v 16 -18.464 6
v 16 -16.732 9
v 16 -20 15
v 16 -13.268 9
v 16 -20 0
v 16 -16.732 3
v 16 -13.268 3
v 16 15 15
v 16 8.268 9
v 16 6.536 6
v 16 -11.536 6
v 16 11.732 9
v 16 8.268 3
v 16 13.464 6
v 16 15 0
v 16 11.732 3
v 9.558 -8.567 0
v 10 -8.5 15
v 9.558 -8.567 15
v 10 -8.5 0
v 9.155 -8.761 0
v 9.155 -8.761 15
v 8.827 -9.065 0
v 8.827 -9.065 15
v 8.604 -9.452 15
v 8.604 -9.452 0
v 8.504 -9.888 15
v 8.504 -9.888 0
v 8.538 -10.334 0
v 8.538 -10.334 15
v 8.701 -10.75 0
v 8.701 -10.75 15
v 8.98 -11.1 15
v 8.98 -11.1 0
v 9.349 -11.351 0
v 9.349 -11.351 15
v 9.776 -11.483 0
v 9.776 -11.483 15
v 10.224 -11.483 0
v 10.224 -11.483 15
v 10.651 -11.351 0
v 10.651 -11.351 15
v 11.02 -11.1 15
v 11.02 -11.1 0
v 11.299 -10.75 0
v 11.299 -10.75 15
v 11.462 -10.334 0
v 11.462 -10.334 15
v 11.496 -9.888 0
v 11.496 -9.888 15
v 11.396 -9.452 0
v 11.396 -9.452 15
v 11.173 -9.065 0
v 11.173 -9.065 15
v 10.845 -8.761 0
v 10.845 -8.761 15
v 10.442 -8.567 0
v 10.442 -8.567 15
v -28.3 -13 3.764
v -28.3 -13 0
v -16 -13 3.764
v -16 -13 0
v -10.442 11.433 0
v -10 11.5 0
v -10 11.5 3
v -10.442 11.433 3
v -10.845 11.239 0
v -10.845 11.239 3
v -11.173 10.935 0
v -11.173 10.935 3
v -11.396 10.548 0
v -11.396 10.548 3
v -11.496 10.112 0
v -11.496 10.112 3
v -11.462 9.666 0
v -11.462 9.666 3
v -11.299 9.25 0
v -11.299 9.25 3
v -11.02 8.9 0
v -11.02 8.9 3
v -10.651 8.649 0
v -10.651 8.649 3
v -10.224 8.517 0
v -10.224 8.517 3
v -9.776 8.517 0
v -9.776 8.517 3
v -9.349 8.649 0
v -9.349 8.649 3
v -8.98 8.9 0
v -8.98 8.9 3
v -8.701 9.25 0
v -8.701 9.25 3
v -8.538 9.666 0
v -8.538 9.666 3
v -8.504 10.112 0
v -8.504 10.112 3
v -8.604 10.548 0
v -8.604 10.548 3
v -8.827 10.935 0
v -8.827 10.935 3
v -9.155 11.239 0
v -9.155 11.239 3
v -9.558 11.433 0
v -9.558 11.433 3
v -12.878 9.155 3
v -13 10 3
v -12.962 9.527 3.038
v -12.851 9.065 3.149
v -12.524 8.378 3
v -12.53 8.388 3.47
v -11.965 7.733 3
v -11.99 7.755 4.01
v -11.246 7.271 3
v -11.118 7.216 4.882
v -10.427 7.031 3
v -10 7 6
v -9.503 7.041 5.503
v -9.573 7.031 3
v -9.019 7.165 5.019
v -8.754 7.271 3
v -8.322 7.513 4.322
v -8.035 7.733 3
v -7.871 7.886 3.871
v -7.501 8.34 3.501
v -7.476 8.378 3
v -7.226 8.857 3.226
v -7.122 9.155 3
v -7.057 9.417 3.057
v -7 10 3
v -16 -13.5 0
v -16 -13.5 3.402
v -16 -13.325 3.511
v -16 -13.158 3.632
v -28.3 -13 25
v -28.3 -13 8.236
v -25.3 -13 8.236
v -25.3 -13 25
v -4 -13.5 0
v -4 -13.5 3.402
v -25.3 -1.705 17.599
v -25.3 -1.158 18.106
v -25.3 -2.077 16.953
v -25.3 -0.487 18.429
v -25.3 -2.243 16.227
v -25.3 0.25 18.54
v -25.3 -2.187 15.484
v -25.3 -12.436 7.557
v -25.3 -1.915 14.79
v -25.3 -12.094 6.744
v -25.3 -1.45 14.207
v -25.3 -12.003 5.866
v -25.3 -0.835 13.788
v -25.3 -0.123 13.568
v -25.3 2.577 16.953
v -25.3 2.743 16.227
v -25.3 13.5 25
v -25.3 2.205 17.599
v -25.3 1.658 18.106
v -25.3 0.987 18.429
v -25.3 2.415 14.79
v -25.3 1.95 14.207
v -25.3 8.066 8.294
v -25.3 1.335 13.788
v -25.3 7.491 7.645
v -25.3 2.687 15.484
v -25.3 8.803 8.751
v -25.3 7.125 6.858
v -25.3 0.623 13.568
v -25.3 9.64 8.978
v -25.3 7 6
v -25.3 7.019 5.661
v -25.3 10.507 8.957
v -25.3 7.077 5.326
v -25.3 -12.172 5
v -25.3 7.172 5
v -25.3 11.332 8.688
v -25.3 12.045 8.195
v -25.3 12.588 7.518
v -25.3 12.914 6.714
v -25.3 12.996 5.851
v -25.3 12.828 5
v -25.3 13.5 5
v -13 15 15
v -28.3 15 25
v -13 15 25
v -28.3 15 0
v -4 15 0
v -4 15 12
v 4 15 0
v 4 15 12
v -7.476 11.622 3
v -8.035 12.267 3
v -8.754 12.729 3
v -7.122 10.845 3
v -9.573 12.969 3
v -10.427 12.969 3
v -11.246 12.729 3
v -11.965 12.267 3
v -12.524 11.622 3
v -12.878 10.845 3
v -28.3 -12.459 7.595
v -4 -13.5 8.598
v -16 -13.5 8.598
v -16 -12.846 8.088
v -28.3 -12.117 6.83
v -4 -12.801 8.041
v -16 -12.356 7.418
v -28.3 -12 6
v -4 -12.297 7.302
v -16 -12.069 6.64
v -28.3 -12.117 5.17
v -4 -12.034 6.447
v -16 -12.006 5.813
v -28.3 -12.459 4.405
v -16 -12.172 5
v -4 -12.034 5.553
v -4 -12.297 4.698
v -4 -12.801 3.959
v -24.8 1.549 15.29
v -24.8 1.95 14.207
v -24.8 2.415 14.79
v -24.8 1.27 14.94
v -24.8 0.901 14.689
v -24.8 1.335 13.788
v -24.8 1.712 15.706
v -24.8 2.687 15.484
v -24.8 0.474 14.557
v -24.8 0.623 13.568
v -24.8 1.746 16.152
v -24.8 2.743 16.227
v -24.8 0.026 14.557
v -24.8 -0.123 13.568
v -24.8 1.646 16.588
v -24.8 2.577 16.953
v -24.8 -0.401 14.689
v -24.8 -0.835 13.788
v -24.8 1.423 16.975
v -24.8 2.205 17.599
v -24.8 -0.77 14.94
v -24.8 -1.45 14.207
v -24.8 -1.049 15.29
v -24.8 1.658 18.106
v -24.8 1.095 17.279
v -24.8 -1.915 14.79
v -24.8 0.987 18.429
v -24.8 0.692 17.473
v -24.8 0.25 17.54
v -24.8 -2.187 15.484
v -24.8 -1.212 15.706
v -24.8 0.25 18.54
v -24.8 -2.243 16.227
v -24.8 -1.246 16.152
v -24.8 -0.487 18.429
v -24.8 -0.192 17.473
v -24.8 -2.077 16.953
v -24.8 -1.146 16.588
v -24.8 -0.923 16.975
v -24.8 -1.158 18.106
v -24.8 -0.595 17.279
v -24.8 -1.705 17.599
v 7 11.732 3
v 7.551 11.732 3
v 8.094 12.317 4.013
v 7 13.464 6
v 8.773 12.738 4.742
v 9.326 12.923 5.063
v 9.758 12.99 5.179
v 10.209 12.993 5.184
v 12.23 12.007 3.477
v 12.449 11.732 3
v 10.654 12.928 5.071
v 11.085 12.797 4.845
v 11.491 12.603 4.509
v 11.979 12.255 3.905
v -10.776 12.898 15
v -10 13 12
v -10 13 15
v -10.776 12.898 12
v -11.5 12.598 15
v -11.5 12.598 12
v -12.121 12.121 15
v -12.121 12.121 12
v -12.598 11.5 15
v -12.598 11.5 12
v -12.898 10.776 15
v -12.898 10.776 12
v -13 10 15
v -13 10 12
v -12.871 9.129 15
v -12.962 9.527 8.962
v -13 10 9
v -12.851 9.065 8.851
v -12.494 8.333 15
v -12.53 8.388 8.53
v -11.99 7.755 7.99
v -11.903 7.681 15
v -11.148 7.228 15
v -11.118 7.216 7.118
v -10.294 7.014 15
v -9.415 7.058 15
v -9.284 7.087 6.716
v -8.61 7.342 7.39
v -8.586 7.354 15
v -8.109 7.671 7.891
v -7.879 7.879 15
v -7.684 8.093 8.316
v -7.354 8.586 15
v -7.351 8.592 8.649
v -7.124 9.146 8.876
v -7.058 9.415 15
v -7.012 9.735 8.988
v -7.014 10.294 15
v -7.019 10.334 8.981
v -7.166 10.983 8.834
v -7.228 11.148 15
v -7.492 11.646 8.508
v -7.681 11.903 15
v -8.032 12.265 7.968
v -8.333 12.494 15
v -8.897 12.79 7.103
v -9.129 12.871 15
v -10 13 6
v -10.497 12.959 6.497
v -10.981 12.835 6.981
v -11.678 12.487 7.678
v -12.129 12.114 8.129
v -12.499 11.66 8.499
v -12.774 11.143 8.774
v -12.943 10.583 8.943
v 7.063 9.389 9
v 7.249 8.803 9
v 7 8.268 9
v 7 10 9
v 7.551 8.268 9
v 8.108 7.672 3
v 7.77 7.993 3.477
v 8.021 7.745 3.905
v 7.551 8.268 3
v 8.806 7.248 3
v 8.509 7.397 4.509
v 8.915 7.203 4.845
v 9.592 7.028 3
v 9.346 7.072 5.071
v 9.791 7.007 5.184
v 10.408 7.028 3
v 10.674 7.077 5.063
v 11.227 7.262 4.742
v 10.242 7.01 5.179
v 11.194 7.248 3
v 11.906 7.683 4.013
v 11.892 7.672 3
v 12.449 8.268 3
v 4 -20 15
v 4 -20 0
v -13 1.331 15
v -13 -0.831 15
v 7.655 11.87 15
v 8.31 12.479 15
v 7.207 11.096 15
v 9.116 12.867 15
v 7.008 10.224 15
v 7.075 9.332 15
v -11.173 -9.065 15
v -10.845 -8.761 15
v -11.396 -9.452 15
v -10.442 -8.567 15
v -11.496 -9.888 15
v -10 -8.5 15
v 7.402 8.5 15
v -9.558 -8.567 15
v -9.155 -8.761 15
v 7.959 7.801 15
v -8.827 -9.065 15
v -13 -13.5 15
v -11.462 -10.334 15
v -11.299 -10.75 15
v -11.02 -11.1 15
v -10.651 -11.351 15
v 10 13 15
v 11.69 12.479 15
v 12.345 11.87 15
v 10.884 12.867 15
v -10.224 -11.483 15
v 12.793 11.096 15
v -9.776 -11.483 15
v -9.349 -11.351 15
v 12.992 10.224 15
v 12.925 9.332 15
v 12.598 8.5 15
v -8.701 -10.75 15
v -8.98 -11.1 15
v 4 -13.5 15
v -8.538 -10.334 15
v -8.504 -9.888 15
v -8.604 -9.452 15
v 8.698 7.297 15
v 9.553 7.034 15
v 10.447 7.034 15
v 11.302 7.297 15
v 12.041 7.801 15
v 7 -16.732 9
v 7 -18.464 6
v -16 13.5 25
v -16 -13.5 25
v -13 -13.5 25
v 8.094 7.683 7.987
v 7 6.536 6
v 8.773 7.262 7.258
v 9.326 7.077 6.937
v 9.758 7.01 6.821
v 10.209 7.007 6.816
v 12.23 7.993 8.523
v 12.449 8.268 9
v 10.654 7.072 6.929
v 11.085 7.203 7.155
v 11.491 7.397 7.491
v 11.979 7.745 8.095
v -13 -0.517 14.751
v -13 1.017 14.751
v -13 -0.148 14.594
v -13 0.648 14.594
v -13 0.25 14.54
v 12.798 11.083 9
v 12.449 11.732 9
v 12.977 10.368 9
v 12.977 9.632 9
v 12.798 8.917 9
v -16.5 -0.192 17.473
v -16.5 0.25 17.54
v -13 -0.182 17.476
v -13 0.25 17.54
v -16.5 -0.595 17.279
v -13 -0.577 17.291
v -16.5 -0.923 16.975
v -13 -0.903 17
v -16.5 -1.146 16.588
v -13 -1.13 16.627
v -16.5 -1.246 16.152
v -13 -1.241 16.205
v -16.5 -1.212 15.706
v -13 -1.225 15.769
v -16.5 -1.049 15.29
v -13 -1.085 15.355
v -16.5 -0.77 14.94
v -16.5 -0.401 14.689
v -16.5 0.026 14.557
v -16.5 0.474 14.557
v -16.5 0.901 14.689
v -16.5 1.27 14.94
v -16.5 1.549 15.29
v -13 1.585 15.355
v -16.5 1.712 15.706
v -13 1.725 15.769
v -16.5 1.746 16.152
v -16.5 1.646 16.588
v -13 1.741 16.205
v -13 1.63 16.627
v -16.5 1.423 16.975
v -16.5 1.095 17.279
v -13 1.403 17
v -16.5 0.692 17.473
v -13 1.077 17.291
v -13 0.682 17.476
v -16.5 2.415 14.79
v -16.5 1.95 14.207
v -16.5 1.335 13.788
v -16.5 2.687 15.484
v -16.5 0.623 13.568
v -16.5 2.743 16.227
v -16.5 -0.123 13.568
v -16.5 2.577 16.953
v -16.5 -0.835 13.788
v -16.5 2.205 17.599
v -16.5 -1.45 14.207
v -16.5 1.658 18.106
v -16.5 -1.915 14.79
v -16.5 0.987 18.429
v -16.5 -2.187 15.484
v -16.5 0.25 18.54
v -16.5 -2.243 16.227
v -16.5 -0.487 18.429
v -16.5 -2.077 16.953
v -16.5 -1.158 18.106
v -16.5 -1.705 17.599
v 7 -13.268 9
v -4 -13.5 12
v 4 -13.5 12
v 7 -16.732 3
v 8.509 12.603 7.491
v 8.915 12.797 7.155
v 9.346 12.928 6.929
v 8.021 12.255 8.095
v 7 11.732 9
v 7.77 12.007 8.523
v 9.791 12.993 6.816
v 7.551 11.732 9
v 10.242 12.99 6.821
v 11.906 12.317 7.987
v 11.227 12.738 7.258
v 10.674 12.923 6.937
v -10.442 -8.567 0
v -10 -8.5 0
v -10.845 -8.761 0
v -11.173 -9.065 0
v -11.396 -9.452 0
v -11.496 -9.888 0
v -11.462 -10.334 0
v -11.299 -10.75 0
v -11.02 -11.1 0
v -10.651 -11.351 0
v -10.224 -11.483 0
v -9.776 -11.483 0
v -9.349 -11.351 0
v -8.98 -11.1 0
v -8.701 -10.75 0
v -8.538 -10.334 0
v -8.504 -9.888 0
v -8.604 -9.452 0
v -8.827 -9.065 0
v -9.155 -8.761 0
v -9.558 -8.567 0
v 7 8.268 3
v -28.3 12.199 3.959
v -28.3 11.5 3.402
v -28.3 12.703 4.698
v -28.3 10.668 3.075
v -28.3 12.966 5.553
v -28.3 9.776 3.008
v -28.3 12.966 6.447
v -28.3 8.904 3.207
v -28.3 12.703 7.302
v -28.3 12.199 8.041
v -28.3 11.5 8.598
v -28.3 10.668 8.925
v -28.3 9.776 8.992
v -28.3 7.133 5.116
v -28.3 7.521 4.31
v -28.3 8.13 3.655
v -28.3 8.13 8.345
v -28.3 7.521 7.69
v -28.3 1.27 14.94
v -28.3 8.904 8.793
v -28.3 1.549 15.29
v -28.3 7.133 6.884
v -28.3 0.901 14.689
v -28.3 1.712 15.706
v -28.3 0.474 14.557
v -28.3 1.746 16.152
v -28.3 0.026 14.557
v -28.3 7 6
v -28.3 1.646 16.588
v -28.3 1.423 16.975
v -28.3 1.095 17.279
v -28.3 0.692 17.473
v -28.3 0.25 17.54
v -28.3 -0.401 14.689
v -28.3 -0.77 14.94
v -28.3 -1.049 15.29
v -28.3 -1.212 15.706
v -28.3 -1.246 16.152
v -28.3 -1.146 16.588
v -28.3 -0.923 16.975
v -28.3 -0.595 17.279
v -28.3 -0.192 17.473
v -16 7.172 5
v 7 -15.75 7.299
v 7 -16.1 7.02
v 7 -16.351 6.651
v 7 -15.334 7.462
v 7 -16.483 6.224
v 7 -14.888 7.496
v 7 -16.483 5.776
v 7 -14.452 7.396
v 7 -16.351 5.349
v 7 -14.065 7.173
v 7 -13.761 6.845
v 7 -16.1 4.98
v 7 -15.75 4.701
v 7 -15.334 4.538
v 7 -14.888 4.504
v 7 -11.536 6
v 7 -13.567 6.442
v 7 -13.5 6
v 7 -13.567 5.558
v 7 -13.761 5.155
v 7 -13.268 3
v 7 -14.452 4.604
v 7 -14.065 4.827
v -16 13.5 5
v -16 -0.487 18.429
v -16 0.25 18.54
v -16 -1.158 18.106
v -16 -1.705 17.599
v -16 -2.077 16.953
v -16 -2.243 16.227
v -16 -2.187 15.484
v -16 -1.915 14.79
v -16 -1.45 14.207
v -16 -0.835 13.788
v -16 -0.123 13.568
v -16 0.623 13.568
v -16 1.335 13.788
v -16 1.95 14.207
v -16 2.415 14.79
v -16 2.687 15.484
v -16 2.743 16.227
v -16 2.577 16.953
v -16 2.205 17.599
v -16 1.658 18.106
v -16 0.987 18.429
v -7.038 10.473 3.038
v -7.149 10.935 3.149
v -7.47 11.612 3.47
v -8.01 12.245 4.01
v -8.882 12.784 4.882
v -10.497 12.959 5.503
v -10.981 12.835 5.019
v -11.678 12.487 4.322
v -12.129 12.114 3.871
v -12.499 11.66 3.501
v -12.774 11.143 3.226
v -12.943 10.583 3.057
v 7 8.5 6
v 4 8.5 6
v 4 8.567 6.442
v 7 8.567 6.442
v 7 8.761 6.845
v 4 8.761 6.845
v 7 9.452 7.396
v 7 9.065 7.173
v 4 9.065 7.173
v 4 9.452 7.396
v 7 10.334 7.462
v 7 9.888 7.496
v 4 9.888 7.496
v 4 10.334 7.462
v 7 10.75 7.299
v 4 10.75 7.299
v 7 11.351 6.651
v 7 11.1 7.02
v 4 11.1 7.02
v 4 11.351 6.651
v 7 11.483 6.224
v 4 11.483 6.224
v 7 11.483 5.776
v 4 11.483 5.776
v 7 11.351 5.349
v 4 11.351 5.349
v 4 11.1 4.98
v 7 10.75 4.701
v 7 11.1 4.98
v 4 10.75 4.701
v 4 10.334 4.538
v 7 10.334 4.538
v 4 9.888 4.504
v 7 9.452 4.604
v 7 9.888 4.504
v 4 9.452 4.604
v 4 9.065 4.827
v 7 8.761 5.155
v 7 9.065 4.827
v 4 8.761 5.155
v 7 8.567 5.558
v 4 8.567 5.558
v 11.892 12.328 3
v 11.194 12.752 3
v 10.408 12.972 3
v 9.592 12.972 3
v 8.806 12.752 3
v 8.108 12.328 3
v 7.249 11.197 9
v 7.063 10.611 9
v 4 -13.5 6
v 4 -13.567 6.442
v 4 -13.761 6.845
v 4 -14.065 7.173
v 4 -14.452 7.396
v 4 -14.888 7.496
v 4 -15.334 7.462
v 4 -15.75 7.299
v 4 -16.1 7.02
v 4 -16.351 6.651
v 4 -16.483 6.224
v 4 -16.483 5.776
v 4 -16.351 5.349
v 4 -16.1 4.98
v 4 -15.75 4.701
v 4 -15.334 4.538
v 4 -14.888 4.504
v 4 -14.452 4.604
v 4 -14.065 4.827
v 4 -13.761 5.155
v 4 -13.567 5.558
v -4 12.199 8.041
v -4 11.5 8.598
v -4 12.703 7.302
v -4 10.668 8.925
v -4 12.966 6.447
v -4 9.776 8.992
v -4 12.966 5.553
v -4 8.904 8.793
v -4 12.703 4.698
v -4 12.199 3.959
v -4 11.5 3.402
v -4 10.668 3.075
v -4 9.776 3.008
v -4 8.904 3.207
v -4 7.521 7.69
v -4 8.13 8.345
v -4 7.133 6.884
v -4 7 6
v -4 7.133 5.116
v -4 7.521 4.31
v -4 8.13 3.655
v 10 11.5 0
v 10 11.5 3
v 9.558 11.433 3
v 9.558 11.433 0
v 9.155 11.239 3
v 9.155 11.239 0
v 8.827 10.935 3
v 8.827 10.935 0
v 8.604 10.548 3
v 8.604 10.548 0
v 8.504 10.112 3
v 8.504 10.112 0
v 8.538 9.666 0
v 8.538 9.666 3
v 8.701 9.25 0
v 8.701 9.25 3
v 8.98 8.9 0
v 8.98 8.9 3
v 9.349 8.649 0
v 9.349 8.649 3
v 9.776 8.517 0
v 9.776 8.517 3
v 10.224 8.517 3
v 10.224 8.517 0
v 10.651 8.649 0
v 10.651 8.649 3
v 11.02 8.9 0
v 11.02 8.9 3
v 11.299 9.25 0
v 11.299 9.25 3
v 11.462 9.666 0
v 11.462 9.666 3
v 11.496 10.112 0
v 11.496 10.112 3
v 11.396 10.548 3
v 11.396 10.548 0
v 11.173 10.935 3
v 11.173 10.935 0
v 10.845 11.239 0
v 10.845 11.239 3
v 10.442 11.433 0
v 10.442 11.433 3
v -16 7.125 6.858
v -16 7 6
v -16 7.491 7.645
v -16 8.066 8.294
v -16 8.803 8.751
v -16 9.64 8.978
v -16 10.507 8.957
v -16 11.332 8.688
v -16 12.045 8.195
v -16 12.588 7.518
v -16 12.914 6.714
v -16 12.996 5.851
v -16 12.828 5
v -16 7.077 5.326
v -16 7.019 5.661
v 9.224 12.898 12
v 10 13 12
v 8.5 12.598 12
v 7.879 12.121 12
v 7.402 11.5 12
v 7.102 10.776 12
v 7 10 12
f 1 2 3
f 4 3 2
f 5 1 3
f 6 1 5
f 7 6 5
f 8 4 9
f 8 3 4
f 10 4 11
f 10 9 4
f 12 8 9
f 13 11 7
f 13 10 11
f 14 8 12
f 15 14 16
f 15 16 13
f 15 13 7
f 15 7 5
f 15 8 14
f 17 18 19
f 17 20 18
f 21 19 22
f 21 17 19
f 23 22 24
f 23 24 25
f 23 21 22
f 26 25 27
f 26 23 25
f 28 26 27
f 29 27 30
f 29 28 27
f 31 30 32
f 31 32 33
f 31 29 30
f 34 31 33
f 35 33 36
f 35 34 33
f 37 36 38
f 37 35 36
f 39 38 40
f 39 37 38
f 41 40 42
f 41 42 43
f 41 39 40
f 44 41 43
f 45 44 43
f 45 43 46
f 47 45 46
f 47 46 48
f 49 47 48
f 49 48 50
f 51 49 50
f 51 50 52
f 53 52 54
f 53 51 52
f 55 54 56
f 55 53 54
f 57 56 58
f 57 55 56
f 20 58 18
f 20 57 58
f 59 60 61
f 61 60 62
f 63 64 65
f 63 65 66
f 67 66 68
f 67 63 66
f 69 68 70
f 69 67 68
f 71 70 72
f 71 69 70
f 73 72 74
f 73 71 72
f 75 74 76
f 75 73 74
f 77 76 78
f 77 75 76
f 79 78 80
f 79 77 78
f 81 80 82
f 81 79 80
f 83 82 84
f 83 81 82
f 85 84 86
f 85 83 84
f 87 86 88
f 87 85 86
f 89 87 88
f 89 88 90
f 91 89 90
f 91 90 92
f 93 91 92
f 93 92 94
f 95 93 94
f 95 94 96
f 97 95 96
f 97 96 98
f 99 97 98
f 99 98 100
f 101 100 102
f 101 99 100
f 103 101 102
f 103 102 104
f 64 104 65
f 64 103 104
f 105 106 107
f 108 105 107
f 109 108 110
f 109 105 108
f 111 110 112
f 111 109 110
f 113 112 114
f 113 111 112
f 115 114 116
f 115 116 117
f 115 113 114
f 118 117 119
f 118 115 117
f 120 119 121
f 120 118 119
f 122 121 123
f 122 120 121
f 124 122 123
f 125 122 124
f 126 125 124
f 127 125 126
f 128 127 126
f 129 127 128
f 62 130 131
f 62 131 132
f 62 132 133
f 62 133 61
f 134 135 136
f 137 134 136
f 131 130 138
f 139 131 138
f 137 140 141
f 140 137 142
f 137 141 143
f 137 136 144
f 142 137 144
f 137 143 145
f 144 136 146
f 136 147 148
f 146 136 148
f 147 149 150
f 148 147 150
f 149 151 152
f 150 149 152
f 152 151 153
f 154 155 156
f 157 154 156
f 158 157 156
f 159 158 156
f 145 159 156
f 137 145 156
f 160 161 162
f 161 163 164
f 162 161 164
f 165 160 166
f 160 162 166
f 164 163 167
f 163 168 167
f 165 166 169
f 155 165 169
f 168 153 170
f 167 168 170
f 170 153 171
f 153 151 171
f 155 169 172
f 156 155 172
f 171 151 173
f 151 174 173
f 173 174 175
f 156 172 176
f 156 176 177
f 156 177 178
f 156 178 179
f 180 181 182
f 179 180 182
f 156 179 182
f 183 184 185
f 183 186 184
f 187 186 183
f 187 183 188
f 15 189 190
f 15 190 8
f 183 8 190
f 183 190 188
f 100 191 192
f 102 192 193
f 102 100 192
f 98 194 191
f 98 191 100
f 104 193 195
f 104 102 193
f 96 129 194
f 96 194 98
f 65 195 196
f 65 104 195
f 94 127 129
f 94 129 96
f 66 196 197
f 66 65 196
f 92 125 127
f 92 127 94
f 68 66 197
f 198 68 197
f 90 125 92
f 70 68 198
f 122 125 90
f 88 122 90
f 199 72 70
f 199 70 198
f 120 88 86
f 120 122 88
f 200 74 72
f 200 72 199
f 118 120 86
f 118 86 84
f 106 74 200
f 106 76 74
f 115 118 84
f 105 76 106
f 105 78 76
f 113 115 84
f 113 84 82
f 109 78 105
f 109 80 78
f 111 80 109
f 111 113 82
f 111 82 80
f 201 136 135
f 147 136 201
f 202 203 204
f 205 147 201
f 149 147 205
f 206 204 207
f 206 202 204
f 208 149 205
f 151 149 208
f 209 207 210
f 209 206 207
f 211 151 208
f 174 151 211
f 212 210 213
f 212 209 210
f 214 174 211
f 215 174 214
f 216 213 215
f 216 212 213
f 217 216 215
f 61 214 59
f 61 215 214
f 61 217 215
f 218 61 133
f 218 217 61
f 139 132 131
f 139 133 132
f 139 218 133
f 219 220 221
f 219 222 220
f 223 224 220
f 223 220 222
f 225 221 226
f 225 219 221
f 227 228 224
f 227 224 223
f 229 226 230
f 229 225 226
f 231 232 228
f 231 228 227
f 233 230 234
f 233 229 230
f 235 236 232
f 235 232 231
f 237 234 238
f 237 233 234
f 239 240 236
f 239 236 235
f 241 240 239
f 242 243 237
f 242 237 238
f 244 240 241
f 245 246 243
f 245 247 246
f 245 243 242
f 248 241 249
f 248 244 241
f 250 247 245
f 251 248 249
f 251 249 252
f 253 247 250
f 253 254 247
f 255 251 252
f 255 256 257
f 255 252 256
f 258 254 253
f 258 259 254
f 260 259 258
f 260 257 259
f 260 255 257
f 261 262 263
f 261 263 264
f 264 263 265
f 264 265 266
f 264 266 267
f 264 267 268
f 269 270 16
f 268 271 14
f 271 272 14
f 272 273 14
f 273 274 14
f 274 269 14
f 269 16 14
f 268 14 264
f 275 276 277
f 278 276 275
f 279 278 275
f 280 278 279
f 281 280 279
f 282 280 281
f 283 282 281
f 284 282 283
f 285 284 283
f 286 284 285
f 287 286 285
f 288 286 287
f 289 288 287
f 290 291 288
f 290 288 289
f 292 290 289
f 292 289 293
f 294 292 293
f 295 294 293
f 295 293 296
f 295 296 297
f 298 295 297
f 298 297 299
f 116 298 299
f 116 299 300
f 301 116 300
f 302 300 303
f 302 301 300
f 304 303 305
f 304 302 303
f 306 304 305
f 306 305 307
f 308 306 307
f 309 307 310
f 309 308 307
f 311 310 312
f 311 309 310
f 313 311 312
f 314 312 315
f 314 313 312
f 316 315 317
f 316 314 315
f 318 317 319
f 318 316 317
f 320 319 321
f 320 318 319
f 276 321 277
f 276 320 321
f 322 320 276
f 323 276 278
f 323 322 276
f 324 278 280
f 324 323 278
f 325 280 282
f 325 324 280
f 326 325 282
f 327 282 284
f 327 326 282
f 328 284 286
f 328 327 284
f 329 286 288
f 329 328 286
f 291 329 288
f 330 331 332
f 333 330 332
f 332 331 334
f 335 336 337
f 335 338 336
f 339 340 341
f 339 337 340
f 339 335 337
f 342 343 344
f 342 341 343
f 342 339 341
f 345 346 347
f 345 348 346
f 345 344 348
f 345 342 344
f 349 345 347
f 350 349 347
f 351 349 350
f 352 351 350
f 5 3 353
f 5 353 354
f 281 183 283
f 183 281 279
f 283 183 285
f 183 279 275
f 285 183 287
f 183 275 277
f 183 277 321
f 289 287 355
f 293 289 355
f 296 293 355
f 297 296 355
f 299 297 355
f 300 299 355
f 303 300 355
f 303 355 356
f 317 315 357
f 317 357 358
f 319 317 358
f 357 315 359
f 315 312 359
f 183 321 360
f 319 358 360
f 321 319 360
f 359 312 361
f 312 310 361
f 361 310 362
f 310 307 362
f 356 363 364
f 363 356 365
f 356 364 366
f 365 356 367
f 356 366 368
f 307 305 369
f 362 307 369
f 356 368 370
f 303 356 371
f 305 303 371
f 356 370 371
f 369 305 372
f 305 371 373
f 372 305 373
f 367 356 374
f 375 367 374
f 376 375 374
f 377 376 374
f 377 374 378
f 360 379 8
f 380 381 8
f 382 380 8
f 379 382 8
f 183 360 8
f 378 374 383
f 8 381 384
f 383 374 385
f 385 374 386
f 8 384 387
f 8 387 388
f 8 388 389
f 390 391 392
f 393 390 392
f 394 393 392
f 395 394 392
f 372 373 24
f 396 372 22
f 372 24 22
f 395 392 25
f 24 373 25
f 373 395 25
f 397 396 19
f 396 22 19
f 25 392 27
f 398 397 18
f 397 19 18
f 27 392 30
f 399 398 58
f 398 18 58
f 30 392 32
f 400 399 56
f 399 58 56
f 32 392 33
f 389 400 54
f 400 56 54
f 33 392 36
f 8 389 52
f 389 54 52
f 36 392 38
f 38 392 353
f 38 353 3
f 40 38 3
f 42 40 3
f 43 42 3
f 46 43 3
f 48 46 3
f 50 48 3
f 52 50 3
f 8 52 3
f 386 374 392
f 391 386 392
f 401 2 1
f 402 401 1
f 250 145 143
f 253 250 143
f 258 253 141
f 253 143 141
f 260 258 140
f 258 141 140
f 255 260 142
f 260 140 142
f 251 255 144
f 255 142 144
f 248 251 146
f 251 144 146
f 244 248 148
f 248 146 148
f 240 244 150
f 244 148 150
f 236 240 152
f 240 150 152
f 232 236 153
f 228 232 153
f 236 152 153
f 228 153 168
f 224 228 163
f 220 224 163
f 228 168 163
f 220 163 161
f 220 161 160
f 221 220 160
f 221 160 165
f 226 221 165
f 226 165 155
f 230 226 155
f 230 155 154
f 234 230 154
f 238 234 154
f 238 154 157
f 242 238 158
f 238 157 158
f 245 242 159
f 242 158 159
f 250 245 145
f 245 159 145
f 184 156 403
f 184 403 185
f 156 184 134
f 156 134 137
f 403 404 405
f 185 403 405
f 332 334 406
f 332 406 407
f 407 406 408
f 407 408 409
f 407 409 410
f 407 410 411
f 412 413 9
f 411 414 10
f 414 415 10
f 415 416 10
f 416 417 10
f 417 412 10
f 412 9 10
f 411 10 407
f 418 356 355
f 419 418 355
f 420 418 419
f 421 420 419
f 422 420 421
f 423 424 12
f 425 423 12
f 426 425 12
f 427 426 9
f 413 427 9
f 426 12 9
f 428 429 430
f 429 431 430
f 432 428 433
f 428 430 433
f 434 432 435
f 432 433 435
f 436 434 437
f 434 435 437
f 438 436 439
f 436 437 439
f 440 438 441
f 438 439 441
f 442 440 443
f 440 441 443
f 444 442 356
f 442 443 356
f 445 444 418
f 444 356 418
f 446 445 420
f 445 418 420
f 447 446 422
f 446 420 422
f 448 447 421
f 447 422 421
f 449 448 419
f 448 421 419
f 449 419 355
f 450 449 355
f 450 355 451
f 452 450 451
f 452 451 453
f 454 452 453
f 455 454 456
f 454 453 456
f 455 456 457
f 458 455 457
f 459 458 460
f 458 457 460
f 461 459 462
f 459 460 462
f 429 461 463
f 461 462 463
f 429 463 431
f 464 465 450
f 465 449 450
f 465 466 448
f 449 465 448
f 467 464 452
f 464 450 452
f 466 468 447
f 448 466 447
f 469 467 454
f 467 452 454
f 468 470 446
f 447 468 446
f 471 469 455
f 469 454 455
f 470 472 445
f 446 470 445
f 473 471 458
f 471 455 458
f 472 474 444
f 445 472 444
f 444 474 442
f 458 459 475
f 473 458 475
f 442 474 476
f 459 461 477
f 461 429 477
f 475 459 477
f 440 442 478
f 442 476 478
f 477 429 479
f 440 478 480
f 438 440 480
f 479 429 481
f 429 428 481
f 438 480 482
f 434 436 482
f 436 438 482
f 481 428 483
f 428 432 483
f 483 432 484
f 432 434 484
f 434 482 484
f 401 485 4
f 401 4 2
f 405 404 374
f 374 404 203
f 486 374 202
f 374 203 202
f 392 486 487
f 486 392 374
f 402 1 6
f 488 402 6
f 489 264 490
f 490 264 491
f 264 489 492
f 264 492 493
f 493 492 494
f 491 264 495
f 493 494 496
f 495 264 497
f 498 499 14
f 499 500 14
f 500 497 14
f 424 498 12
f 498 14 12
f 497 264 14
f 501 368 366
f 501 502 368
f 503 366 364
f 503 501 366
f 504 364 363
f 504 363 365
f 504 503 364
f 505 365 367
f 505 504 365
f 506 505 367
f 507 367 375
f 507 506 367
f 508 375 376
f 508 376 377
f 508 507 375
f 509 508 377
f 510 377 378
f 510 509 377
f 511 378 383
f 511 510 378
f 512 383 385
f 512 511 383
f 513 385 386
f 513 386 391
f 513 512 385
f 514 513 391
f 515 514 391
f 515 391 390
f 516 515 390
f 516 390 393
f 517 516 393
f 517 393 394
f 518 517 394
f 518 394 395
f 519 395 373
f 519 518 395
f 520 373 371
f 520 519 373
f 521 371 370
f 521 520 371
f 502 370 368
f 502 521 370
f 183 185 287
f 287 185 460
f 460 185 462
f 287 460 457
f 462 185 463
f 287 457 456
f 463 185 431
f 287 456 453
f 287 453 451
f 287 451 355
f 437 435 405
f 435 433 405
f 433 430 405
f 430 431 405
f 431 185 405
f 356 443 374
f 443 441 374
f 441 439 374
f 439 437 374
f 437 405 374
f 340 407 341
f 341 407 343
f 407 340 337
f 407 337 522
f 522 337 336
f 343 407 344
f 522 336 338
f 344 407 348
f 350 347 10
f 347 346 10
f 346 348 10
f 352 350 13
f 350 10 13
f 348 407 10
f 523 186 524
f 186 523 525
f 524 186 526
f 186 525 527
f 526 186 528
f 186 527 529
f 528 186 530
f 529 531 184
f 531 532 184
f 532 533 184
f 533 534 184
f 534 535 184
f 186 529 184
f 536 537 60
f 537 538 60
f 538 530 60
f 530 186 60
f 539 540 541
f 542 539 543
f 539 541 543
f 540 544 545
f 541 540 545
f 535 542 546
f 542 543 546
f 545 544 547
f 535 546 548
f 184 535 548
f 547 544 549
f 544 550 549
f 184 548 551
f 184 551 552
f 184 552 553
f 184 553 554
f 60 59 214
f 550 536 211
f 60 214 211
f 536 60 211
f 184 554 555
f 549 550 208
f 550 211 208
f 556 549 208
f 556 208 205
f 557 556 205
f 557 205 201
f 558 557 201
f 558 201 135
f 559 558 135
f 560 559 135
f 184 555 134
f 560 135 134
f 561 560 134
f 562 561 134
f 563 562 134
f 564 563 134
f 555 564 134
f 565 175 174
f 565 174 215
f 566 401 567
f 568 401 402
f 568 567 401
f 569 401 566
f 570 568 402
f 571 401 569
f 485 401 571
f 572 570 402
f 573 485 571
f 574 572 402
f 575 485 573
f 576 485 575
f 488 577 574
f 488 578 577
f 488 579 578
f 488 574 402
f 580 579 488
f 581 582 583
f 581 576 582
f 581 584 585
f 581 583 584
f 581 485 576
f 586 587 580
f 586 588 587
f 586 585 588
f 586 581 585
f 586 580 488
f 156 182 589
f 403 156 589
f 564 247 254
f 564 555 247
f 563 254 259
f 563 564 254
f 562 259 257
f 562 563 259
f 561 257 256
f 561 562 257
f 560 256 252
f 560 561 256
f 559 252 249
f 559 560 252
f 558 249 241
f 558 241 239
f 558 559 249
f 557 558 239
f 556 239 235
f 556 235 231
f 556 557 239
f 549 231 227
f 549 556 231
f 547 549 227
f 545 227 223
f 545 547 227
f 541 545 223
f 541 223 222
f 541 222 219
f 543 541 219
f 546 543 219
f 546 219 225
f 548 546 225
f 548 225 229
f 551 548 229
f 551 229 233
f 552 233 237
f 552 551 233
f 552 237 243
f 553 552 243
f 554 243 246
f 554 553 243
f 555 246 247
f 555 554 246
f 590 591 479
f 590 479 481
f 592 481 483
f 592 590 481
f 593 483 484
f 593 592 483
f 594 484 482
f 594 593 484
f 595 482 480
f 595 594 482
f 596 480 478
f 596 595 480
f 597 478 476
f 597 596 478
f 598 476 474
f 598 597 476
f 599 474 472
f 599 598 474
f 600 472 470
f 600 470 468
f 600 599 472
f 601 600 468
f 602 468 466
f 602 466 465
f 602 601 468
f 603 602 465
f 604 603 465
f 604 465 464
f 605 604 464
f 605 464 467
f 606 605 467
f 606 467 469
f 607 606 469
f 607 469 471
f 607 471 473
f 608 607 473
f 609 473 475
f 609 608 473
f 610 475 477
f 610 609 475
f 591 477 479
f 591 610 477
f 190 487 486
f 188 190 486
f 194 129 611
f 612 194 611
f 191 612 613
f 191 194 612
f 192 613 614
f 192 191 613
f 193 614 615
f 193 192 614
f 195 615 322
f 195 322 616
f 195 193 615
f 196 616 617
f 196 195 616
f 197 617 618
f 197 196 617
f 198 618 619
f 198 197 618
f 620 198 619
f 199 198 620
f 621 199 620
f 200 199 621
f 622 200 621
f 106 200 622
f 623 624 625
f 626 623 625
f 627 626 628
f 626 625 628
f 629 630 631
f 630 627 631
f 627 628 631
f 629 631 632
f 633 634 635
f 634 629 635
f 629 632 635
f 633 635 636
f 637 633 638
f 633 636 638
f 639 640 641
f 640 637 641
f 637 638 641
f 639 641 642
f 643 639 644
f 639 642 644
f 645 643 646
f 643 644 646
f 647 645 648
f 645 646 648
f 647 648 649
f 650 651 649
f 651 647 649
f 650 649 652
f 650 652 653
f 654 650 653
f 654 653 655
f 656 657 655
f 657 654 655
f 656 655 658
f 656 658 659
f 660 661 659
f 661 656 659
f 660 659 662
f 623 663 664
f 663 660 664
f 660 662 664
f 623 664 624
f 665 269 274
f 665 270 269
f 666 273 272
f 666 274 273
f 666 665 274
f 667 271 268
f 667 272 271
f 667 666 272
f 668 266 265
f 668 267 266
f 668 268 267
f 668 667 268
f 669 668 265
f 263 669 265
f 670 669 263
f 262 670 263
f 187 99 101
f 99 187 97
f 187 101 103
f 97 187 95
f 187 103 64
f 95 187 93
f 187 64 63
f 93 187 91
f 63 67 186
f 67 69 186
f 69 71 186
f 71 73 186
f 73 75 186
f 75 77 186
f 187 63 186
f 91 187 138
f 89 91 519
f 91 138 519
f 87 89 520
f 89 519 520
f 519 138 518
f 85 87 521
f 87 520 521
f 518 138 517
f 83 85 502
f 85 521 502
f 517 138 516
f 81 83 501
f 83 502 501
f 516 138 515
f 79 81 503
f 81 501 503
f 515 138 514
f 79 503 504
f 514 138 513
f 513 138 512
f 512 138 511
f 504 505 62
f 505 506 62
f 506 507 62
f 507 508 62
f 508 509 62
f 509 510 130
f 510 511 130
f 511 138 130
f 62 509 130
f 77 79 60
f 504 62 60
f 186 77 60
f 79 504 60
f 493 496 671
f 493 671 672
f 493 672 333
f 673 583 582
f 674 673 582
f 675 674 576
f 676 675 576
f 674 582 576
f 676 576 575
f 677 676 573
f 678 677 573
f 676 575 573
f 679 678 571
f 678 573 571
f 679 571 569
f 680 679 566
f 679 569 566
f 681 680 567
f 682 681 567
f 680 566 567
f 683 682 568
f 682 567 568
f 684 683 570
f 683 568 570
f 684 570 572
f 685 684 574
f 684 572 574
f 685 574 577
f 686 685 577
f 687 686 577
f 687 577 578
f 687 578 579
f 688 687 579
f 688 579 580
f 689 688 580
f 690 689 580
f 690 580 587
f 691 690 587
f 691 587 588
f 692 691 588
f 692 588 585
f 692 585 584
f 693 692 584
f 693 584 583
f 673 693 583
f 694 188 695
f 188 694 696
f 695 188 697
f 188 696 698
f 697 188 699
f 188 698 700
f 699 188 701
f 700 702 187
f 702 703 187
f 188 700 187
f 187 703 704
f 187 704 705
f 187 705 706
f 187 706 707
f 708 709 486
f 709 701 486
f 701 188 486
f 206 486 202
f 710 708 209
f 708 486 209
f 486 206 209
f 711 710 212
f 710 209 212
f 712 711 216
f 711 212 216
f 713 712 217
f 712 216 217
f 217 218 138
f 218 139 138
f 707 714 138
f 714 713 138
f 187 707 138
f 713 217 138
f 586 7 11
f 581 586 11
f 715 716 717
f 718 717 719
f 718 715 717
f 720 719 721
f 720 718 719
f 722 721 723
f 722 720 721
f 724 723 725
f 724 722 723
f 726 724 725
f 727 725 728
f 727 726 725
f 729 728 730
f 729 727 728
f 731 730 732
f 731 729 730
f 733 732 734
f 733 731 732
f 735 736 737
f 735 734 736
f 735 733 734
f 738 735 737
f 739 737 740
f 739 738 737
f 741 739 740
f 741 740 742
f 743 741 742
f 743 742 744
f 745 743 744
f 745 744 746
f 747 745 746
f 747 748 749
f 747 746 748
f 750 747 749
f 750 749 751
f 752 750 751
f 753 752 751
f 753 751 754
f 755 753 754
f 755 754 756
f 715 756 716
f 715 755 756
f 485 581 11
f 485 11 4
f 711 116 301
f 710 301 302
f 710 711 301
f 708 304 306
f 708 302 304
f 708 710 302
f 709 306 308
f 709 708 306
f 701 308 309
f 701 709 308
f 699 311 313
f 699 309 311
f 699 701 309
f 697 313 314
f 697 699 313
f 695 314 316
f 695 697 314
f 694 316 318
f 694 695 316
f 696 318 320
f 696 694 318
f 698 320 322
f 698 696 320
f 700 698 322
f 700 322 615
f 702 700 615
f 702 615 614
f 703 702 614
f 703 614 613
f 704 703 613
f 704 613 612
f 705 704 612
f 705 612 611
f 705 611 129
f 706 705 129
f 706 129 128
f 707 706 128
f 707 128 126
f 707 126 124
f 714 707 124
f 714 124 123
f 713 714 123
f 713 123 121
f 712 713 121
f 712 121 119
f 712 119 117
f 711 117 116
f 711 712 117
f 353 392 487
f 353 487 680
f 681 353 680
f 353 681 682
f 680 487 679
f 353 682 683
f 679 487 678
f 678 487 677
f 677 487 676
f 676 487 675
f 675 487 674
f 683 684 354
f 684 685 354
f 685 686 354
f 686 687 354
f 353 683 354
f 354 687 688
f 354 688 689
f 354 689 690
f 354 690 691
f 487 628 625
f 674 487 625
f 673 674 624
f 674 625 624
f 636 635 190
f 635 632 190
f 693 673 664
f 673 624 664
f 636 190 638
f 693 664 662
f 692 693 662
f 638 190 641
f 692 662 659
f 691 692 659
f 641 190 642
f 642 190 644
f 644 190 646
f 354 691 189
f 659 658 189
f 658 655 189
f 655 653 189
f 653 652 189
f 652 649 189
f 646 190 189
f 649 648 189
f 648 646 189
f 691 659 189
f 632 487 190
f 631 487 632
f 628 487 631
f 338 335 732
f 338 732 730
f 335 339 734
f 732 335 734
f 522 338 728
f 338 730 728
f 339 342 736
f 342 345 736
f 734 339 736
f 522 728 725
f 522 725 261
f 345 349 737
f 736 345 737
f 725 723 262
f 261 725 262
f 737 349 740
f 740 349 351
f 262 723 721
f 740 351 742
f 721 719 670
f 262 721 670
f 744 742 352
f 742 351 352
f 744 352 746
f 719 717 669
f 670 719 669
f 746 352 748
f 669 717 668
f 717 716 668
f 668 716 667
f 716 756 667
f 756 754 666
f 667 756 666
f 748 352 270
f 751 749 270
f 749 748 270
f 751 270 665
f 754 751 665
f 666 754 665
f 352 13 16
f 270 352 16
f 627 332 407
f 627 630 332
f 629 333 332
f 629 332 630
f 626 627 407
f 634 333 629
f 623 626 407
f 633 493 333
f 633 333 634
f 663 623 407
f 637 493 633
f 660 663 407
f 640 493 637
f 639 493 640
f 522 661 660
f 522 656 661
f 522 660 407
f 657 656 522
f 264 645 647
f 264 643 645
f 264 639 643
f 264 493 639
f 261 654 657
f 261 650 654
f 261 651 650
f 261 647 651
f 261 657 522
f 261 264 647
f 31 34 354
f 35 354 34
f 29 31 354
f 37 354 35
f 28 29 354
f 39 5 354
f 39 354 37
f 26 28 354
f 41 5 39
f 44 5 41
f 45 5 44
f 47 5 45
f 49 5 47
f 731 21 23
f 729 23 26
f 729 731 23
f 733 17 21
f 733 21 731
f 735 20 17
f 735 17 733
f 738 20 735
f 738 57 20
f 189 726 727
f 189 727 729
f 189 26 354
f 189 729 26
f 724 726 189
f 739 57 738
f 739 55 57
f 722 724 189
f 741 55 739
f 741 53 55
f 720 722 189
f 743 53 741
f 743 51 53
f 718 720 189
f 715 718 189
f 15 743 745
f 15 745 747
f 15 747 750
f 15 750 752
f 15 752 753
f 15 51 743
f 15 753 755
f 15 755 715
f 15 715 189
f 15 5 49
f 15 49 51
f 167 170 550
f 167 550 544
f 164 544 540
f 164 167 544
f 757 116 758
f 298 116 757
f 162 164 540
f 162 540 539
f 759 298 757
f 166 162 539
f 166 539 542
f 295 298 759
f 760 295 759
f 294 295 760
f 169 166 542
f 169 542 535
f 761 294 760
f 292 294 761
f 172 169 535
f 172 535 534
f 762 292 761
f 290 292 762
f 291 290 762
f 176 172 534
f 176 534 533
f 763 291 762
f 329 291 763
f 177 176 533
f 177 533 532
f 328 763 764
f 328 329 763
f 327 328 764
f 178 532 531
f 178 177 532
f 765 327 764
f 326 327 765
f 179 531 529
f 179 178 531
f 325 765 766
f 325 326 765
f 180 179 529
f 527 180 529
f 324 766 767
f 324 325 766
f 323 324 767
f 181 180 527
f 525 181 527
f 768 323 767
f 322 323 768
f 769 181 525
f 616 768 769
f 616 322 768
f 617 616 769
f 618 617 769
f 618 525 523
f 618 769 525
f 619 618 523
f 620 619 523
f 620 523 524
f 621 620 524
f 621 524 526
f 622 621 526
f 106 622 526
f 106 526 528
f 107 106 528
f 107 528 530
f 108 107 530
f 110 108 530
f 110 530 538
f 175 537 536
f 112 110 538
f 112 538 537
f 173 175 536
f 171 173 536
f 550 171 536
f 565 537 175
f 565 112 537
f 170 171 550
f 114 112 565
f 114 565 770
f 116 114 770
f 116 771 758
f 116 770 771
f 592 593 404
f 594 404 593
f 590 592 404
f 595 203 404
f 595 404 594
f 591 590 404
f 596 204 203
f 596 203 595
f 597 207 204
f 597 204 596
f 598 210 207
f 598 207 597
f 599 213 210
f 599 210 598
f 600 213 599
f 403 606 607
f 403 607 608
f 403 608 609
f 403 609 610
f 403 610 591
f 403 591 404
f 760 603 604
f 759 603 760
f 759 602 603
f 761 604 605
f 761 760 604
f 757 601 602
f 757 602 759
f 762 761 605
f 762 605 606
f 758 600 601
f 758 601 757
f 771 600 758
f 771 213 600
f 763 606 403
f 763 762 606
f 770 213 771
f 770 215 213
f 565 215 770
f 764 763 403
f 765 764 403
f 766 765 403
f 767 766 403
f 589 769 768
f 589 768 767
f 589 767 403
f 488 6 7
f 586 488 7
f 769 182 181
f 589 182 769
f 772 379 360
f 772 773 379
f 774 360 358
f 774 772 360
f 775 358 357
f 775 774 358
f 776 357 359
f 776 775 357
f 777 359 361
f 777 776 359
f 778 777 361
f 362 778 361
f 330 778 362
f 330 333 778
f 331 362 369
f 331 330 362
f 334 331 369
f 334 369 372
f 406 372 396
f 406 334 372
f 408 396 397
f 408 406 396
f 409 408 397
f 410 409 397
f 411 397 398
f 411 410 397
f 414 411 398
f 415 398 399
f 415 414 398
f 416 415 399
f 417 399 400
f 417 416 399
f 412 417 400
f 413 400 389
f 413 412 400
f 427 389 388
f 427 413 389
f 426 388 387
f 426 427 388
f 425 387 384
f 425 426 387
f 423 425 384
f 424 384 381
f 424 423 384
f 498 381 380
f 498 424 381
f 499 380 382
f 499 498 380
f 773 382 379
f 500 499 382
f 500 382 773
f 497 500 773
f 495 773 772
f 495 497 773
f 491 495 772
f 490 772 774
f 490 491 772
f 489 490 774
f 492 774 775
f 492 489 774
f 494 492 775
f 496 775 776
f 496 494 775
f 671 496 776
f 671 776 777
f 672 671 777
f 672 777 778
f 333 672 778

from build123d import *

# Parameters (mm, degrees)
SKETCH1_W           = 12
SKETCH1_H           = 27
SKETCH1_R           = 1.5
SKETCH1_R_2         = 3
BOSS_EXTRUDE1_DEPTH = 12
BOSS_EXTRUDE2_START = 12
SKETCH1_3_W         = 32
SKETCH1_3_H         = 27
SKETCH1_3_R         = 1.5
SKETCH1_3_R_2       = 3
BOSS_EXTRUDE2_DEPTH = 3
SKETCH2_3_R         = 1.5
CUT_EXTRUDE2_DEPTH  = 29.41214529
SKETCH3_W           = 15
SKETCH3_H           = 1.5
SKETCH3_R           = 1.5
BOSS_EXTRUDE3_DEPTH = 12
SKETCH3_4_R         = 1.5
CUT_EXTRUDE3_DEPTH  = 9
SKETCH3_5_R         = 1.5
CUT_EXTRUDE4_DEPTH  = 41.607881008
CUT_EXTRUDE9_START  = 3
SKETCH1_4_R         = 3
SKETCH1_4_R_2       = 1.5
CUT_EXTRUDE9_DEPTH  = 9
SKETCH4_W           = 3
SKETCH4_H           = 26.5
SKETCH4_W_2         = 5
SKETCH4_H_2         = 26
BOSS_EXTRUDE4_DEPTH = 5
SKETCH4_3_W         = 3
SKETCH4_3_H         = 26.5
BOSS_EXTRUDE5_DEPTH = 25
SKETCH5_W           = 3
SKETCH5_H           = 27
BOSS_EXTRUDE6_DEPTH = 10
CUT_EXTRUDE10_REACH = 56.658
SKETCH6_R           = 1.5
SKETCH7_R           = 2.5
SKETCH7_R_2         = 1.5
BOSS_EXTRUDE7_DEPTH = 0.5
BOSS_EXTRUDE8_START = 9.3
SKETCH7_2_R         = 2.5
SKETCH7_2_R_2       = 1.5
BOSS_EXTRUDE8_DEPTH = 0.5
SKETCH2_R           = 3
SKETCH2_R_2         = 1.5
CUT_EXTRUDE1_DEPTH  = 41.193158622
SKETCH8_W           = 9.3
SKETCH8_H           = 20
BOSS_EXTRUDE9_DEPTH = 1.5


with BuildPart() as part:
    # Sketch1 → Boss-Extrude1 (new body)
    with BuildSketch(Plane.XY):
        with Locations((-10, 0)):
            Rectangle(SKETCH1_W, SKETCH1_H)
        with Locations(Location((-10, 10, 0), (0, 0, 90))):
            Circle(SKETCH1_R, mode=Mode.SUBTRACT)
        with Locations(Location((-10, -10, 0), (0, 0, 90))):
            Circle(SKETCH1_R, mode=Mode.SUBTRACT)
        with Locations((10, 0)):
            Rectangle(SKETCH1_W, SKETCH1_H)
        with Locations((10, 10)):
            Circle(SKETCH1_R_2, mode=Mode.SUBTRACT)
        with Locations(Location((10, -10, 0), (0, 0, 90))):
            Circle(SKETCH1_R, mode=Mode.SUBTRACT)
        with Locations((10, 10)):
            Circle(SKETCH1_R_2)
        with Locations(Location((10, 10, 0), (0, 0, 90))):
            Circle(SKETCH1_R, mode=Mode.SUBTRACT)
        with Locations((-10, 10)):
            Circle(SKETCH1_R_2)
        with Locations(Location((-10, 10, 0), (0, 0, 90))):
            Circle(SKETCH1_R, mode=Mode.SUBTRACT)
    extrude(amount=BOSS_EXTRUDE1_DEPTH)

    # Sketch1_3 → Boss-Extrude2 (add)
    with BuildSketch(Plane.XY.offset(BOSS_EXTRUDE2_START)):
        Rectangle(SKETCH1_3_W, SKETCH1_3_H)
        with Locations(Location((-10, -10, 0), (0, 0, 90))):
            Circle(SKETCH1_3_R, mode=Mode.SUBTRACT)
        with Locations(Location((-10, 10, 0), (0, 0, 90))):
            Circle(SKETCH1_3_R_2, mode=Mode.SUBTRACT)
        with Locations(Location((10, 10, 0), (0, 0, 90))):
            Circle(SKETCH1_3_R_2, mode=Mode.SUBTRACT)
        with Locations(Location((10, -10, 0), (0, 0, 90))):
            Circle(SKETCH1_3_R, mode=Mode.SUBTRACT)
    extrude(amount=BOSS_EXTRUDE2_DEPTH)

    # Sketch2_3 → Cut-Extrude2 (cut, through all)
    with BuildSketch(Plane.ZY.offset(4)):
        with Locations((6, -15)):
            Circle(SKETCH2_3_R)
        with Locations(Location((6, 10, 0), (0, 0, 270))):
            Circle(SKETCH2_3_R)
    extrude(amount=-CUT_EXTRUDE2_DEPTH, mode=Mode.SUBTRACT)

    # Sketch3 → Boss-Extrude3 (add)
    with BuildSketch(Plane(origin=(16, 0, 0), x_dir=(0, 0, -1), z_dir=(1, 0, 0))):
        Polygon((-9, -13.5), (-15, -13.5), (-15, -20), (0, -20), (0, -13.5), (-3, -13.5), (-3, -16.732050808), (-6, -18.464101615), (-9, -16.732050808), align=None)
        with Locations((-7.5, 14.25)):
            Rectangle(SKETCH3_W, SKETCH3_H)
        Polygon((-6, -13.5), (-9, -13.5), (-9, -16.732050808), (-6, -18.464101615), (-3, -16.732050808), (-3, -13.5), align=None)
        with BuildLine():
            ThreePointArc((-4.5, -15), (-7.060660172, -16.060660172), (-6, -13.5))
            ThreePointArc((-6, -13.5), (-4.939339828, -13.939339828), (-4.5, -15))
        make_face(mode=Mode.SUBTRACT)
        with Locations((-6, -15)):
            Circle(SKETCH3_R)
    extrude(amount=-BOSS_EXTRUDE3_DEPTH)

    # Sketch3_4 → Cut-Extrude3 (cut)
    with BuildSketch(Plane(origin=(16, 0, 0), x_dir=(0, 0, -1), z_dir=(1, 0, 0))):
        Polygon((-6, 13.464101615), (-9, 11.732050808), (-9, 8.267949192), (-6, 6.535898385), (-3, 8.267949192), (-3, 11.732050808), align=None)
        Polygon((-6, -11.535898385), (-9, -13.267949192), (-9, -16.732050808), (-6, -18.464101615), (-3, -16.732050808), (-3, -13.267949192), align=None)
        with Locations(Location((-6, -15, 0), (0, 0, 90))):
            Circle(SKETCH3_4_R, mode=Mode.SUBTRACT)
    extrude(amount=-CUT_EXTRUDE3_DEPTH, mode=Mode.SUBTRACT)

    # Sketch3_5 → Cut-Extrude4 (cut, through all)
    with BuildSketch(Plane(origin=(16, 0, 0), x_dir=(0, 0, -1), z_dir=(1, 0, 0))):
        with Locations(Location((-6, -15, 0), (0, 0, 90))):
            Circle(SKETCH3_5_R)
        with Locations(Location((-6, 10, 0), (0, 0, 90))):
            Circle(SKETCH3_5_R)
    extrude(amount=-CUT_EXTRUDE4_DEPTH, mode=Mode.SUBTRACT)

    # Sketch1_4 → Cut-Extrude9 (cut)
    with BuildSketch(Plane.XY.offset(CUT_EXTRUDE9_START)):
        with Locations(Location((-10, 10, 0), (0, 0, 180))):
            Circle(SKETCH1_4_R)
        with Locations(Location((-10, 10, 0), (0, 0, 180))):
            Circle(SKETCH1_4_R_2, mode=Mode.SUBTRACT)
        with Locations(Location((10, 10, 0), (0, 0, 180))):
            Circle(SKETCH1_4_R)
        with Locations(Location((10, 10, 0), (0, 0, 180))):
            Circle(SKETCH1_4_R_2, mode=Mode.SUBTRACT)
    extrude(amount=CUT_EXTRUDE9_DEPTH, mode=Mode.SUBTRACT)

    # Sketch4 → Boss-Extrude4 (add)
    with BuildSketch(Plane.XY):
        with Locations((-26.8, 0.25)):
            Rectangle(SKETCH4_W, SKETCH4_H)
        Polygon((-25.3, -13), (-21, -13), (-21, 13), (-16, 13), (-16, 13.5), (-25.3, 13.5), align=None)
        with Locations((-18.5, 0)):
            Rectangle(SKETCH4_W_2, SKETCH4_H_2)
    extrude(amount=BOSS_EXTRUDE4_DEPTH)

    # Sketch4_3 → Boss-Extrude5 (add)
    with BuildSketch(Plane.XY):
        with Locations((-26.8, 0.25)):
            Rectangle(SKETCH4_3_W, SKETCH4_3_H)
    extrude(amount=BOSS_EXTRUDE5_DEPTH)

    # Sketch5 → Boss-Extrude6 (add)
    with BuildSketch(Plane.XY.offset(15)):
        with Locations((-14.5, 0)):
            Rectangle(SKETCH5_W, SKETCH5_H)
    extrude(amount=BOSS_EXTRUDE6_DEPTH)

    # Cut-Extrude10: up to this face of the body (flat: up to its plane)
    cut_extrude10_end = Plane(part.part.faces().sort_by_distance((-13, 0, 20))[0])
    # Sketch6 → Cut-Extrude10 (cut, up to the picked face)
    with BuildSketch(Plane.ZY.offset(28.3), mode=Mode.PRIVATE) as cut_extrude10_sk1:
        with Locations((16.04, 0.25)):
            Circle(SKETCH6_R)
    cut_extrude10_tool1 = split(extrude(cut_extrude10_sk1.sketch, amount=-CUT_EXTRUDE10_REACH, mode=Mode.PRIVATE), bisect_by=cut_extrude10_end, keep=Keep.BOTH, mode=Mode.PRIVATE)
    add(cut_extrude10_tool1.solids().sort_by(Axis((-28.3, 0.25, 16.04), (1, 0, 0)))[0], mode=Mode.SUBTRACT)

    # Sketch7 → Boss-Extrude7 (add)
    with BuildSketch(Plane(origin=(-25.3, 0, 0), x_dir=(0, 0, -1), z_dir=(1, 0, 0))):
        with Locations(Location((-16.04, 0.25, 0), (0, 0, 180))):
            Circle(SKETCH7_R)
        with Locations(Location((-16.04, 0.25, 0), (0, 0, 180))):
            Circle(SKETCH7_R_2, mode=Mode.SUBTRACT)
    extrude(amount=BOSS_EXTRUDE7_DEPTH)

    # Sketch7_2 → Boss-Extrude8 (add)
    with BuildSketch(Plane(origin=(-25.3, 0, 0), x_dir=(0, 0, -1), z_dir=(1, 0, 0)).offset(BOSS_EXTRUDE8_START)):
        with Locations(Location((-16.04, 0.25, 0), (0, 0, 180))):
            Circle(SKETCH7_2_R)
        with Locations(Location((-16.04, 0.25, 0), (0, 0, 180))):
            Circle(SKETCH7_2_R_2, mode=Mode.SUBTRACT)
    extrude(amount=-BOSS_EXTRUDE8_DEPTH)

    # Sketch2 → Cut-Extrude1 (cut, through all)
    with BuildSketch(Plane.ZY.offset(4)):
        with Locations((6, -15)):
            Circle(SKETCH2_R)
        with Locations(Location((6, -15, 0), (0, 0, 90))):
            Circle(SKETCH2_R_2, mode=Mode.SUBTRACT)
        with Locations(Location((6, 10, 0), (0, 0, 270))):
            Circle(SKETCH2_R)
        with Locations(Location((6, 10, 0), (0, 0, 90))):
            Circle(SKETCH2_R_2, mode=Mode.SUBTRACT)
        with Locations(Location((6, -15, 0), (0, 0, 90))):
            Circle(SKETCH2_R_2)
    extrude(amount=CUT_EXTRUDE1_DEPTH, mode=Mode.SUBTRACT)


with BuildPart() as cut_extrude1_kept_piece:
    # of the separate pieces the step leaves, the one the design keeps (cut_extrude1_pieces_kept)
    add(part.part.solids().sort_by_distance((-16, -13.5, 25))[0])

    # Sketch8 → Boss-Extrude9 (add)
    with BuildSketch(Plane(origin=(0, 13.5, 0), x_dir=(1, 0, 0), z_dir=(0, 1, 0))):
        Polygon((-28.3, -25), (-25.3, -25), (-25.3, -5), (-16, -5), (-16, -25), (-13, -25), (-13, -15), (4, -15), (4, -12), (-4, -12), (-4, 0), (-28.3, 0), align=None)
        with Locations((-20.65, -15)):
            Rectangle(SKETCH8_W, SKETCH8_H)
    extrude(amount=BOSS_EXTRUDE9_DEPTH)


solid = cut_extrude1_kept_piece.part
